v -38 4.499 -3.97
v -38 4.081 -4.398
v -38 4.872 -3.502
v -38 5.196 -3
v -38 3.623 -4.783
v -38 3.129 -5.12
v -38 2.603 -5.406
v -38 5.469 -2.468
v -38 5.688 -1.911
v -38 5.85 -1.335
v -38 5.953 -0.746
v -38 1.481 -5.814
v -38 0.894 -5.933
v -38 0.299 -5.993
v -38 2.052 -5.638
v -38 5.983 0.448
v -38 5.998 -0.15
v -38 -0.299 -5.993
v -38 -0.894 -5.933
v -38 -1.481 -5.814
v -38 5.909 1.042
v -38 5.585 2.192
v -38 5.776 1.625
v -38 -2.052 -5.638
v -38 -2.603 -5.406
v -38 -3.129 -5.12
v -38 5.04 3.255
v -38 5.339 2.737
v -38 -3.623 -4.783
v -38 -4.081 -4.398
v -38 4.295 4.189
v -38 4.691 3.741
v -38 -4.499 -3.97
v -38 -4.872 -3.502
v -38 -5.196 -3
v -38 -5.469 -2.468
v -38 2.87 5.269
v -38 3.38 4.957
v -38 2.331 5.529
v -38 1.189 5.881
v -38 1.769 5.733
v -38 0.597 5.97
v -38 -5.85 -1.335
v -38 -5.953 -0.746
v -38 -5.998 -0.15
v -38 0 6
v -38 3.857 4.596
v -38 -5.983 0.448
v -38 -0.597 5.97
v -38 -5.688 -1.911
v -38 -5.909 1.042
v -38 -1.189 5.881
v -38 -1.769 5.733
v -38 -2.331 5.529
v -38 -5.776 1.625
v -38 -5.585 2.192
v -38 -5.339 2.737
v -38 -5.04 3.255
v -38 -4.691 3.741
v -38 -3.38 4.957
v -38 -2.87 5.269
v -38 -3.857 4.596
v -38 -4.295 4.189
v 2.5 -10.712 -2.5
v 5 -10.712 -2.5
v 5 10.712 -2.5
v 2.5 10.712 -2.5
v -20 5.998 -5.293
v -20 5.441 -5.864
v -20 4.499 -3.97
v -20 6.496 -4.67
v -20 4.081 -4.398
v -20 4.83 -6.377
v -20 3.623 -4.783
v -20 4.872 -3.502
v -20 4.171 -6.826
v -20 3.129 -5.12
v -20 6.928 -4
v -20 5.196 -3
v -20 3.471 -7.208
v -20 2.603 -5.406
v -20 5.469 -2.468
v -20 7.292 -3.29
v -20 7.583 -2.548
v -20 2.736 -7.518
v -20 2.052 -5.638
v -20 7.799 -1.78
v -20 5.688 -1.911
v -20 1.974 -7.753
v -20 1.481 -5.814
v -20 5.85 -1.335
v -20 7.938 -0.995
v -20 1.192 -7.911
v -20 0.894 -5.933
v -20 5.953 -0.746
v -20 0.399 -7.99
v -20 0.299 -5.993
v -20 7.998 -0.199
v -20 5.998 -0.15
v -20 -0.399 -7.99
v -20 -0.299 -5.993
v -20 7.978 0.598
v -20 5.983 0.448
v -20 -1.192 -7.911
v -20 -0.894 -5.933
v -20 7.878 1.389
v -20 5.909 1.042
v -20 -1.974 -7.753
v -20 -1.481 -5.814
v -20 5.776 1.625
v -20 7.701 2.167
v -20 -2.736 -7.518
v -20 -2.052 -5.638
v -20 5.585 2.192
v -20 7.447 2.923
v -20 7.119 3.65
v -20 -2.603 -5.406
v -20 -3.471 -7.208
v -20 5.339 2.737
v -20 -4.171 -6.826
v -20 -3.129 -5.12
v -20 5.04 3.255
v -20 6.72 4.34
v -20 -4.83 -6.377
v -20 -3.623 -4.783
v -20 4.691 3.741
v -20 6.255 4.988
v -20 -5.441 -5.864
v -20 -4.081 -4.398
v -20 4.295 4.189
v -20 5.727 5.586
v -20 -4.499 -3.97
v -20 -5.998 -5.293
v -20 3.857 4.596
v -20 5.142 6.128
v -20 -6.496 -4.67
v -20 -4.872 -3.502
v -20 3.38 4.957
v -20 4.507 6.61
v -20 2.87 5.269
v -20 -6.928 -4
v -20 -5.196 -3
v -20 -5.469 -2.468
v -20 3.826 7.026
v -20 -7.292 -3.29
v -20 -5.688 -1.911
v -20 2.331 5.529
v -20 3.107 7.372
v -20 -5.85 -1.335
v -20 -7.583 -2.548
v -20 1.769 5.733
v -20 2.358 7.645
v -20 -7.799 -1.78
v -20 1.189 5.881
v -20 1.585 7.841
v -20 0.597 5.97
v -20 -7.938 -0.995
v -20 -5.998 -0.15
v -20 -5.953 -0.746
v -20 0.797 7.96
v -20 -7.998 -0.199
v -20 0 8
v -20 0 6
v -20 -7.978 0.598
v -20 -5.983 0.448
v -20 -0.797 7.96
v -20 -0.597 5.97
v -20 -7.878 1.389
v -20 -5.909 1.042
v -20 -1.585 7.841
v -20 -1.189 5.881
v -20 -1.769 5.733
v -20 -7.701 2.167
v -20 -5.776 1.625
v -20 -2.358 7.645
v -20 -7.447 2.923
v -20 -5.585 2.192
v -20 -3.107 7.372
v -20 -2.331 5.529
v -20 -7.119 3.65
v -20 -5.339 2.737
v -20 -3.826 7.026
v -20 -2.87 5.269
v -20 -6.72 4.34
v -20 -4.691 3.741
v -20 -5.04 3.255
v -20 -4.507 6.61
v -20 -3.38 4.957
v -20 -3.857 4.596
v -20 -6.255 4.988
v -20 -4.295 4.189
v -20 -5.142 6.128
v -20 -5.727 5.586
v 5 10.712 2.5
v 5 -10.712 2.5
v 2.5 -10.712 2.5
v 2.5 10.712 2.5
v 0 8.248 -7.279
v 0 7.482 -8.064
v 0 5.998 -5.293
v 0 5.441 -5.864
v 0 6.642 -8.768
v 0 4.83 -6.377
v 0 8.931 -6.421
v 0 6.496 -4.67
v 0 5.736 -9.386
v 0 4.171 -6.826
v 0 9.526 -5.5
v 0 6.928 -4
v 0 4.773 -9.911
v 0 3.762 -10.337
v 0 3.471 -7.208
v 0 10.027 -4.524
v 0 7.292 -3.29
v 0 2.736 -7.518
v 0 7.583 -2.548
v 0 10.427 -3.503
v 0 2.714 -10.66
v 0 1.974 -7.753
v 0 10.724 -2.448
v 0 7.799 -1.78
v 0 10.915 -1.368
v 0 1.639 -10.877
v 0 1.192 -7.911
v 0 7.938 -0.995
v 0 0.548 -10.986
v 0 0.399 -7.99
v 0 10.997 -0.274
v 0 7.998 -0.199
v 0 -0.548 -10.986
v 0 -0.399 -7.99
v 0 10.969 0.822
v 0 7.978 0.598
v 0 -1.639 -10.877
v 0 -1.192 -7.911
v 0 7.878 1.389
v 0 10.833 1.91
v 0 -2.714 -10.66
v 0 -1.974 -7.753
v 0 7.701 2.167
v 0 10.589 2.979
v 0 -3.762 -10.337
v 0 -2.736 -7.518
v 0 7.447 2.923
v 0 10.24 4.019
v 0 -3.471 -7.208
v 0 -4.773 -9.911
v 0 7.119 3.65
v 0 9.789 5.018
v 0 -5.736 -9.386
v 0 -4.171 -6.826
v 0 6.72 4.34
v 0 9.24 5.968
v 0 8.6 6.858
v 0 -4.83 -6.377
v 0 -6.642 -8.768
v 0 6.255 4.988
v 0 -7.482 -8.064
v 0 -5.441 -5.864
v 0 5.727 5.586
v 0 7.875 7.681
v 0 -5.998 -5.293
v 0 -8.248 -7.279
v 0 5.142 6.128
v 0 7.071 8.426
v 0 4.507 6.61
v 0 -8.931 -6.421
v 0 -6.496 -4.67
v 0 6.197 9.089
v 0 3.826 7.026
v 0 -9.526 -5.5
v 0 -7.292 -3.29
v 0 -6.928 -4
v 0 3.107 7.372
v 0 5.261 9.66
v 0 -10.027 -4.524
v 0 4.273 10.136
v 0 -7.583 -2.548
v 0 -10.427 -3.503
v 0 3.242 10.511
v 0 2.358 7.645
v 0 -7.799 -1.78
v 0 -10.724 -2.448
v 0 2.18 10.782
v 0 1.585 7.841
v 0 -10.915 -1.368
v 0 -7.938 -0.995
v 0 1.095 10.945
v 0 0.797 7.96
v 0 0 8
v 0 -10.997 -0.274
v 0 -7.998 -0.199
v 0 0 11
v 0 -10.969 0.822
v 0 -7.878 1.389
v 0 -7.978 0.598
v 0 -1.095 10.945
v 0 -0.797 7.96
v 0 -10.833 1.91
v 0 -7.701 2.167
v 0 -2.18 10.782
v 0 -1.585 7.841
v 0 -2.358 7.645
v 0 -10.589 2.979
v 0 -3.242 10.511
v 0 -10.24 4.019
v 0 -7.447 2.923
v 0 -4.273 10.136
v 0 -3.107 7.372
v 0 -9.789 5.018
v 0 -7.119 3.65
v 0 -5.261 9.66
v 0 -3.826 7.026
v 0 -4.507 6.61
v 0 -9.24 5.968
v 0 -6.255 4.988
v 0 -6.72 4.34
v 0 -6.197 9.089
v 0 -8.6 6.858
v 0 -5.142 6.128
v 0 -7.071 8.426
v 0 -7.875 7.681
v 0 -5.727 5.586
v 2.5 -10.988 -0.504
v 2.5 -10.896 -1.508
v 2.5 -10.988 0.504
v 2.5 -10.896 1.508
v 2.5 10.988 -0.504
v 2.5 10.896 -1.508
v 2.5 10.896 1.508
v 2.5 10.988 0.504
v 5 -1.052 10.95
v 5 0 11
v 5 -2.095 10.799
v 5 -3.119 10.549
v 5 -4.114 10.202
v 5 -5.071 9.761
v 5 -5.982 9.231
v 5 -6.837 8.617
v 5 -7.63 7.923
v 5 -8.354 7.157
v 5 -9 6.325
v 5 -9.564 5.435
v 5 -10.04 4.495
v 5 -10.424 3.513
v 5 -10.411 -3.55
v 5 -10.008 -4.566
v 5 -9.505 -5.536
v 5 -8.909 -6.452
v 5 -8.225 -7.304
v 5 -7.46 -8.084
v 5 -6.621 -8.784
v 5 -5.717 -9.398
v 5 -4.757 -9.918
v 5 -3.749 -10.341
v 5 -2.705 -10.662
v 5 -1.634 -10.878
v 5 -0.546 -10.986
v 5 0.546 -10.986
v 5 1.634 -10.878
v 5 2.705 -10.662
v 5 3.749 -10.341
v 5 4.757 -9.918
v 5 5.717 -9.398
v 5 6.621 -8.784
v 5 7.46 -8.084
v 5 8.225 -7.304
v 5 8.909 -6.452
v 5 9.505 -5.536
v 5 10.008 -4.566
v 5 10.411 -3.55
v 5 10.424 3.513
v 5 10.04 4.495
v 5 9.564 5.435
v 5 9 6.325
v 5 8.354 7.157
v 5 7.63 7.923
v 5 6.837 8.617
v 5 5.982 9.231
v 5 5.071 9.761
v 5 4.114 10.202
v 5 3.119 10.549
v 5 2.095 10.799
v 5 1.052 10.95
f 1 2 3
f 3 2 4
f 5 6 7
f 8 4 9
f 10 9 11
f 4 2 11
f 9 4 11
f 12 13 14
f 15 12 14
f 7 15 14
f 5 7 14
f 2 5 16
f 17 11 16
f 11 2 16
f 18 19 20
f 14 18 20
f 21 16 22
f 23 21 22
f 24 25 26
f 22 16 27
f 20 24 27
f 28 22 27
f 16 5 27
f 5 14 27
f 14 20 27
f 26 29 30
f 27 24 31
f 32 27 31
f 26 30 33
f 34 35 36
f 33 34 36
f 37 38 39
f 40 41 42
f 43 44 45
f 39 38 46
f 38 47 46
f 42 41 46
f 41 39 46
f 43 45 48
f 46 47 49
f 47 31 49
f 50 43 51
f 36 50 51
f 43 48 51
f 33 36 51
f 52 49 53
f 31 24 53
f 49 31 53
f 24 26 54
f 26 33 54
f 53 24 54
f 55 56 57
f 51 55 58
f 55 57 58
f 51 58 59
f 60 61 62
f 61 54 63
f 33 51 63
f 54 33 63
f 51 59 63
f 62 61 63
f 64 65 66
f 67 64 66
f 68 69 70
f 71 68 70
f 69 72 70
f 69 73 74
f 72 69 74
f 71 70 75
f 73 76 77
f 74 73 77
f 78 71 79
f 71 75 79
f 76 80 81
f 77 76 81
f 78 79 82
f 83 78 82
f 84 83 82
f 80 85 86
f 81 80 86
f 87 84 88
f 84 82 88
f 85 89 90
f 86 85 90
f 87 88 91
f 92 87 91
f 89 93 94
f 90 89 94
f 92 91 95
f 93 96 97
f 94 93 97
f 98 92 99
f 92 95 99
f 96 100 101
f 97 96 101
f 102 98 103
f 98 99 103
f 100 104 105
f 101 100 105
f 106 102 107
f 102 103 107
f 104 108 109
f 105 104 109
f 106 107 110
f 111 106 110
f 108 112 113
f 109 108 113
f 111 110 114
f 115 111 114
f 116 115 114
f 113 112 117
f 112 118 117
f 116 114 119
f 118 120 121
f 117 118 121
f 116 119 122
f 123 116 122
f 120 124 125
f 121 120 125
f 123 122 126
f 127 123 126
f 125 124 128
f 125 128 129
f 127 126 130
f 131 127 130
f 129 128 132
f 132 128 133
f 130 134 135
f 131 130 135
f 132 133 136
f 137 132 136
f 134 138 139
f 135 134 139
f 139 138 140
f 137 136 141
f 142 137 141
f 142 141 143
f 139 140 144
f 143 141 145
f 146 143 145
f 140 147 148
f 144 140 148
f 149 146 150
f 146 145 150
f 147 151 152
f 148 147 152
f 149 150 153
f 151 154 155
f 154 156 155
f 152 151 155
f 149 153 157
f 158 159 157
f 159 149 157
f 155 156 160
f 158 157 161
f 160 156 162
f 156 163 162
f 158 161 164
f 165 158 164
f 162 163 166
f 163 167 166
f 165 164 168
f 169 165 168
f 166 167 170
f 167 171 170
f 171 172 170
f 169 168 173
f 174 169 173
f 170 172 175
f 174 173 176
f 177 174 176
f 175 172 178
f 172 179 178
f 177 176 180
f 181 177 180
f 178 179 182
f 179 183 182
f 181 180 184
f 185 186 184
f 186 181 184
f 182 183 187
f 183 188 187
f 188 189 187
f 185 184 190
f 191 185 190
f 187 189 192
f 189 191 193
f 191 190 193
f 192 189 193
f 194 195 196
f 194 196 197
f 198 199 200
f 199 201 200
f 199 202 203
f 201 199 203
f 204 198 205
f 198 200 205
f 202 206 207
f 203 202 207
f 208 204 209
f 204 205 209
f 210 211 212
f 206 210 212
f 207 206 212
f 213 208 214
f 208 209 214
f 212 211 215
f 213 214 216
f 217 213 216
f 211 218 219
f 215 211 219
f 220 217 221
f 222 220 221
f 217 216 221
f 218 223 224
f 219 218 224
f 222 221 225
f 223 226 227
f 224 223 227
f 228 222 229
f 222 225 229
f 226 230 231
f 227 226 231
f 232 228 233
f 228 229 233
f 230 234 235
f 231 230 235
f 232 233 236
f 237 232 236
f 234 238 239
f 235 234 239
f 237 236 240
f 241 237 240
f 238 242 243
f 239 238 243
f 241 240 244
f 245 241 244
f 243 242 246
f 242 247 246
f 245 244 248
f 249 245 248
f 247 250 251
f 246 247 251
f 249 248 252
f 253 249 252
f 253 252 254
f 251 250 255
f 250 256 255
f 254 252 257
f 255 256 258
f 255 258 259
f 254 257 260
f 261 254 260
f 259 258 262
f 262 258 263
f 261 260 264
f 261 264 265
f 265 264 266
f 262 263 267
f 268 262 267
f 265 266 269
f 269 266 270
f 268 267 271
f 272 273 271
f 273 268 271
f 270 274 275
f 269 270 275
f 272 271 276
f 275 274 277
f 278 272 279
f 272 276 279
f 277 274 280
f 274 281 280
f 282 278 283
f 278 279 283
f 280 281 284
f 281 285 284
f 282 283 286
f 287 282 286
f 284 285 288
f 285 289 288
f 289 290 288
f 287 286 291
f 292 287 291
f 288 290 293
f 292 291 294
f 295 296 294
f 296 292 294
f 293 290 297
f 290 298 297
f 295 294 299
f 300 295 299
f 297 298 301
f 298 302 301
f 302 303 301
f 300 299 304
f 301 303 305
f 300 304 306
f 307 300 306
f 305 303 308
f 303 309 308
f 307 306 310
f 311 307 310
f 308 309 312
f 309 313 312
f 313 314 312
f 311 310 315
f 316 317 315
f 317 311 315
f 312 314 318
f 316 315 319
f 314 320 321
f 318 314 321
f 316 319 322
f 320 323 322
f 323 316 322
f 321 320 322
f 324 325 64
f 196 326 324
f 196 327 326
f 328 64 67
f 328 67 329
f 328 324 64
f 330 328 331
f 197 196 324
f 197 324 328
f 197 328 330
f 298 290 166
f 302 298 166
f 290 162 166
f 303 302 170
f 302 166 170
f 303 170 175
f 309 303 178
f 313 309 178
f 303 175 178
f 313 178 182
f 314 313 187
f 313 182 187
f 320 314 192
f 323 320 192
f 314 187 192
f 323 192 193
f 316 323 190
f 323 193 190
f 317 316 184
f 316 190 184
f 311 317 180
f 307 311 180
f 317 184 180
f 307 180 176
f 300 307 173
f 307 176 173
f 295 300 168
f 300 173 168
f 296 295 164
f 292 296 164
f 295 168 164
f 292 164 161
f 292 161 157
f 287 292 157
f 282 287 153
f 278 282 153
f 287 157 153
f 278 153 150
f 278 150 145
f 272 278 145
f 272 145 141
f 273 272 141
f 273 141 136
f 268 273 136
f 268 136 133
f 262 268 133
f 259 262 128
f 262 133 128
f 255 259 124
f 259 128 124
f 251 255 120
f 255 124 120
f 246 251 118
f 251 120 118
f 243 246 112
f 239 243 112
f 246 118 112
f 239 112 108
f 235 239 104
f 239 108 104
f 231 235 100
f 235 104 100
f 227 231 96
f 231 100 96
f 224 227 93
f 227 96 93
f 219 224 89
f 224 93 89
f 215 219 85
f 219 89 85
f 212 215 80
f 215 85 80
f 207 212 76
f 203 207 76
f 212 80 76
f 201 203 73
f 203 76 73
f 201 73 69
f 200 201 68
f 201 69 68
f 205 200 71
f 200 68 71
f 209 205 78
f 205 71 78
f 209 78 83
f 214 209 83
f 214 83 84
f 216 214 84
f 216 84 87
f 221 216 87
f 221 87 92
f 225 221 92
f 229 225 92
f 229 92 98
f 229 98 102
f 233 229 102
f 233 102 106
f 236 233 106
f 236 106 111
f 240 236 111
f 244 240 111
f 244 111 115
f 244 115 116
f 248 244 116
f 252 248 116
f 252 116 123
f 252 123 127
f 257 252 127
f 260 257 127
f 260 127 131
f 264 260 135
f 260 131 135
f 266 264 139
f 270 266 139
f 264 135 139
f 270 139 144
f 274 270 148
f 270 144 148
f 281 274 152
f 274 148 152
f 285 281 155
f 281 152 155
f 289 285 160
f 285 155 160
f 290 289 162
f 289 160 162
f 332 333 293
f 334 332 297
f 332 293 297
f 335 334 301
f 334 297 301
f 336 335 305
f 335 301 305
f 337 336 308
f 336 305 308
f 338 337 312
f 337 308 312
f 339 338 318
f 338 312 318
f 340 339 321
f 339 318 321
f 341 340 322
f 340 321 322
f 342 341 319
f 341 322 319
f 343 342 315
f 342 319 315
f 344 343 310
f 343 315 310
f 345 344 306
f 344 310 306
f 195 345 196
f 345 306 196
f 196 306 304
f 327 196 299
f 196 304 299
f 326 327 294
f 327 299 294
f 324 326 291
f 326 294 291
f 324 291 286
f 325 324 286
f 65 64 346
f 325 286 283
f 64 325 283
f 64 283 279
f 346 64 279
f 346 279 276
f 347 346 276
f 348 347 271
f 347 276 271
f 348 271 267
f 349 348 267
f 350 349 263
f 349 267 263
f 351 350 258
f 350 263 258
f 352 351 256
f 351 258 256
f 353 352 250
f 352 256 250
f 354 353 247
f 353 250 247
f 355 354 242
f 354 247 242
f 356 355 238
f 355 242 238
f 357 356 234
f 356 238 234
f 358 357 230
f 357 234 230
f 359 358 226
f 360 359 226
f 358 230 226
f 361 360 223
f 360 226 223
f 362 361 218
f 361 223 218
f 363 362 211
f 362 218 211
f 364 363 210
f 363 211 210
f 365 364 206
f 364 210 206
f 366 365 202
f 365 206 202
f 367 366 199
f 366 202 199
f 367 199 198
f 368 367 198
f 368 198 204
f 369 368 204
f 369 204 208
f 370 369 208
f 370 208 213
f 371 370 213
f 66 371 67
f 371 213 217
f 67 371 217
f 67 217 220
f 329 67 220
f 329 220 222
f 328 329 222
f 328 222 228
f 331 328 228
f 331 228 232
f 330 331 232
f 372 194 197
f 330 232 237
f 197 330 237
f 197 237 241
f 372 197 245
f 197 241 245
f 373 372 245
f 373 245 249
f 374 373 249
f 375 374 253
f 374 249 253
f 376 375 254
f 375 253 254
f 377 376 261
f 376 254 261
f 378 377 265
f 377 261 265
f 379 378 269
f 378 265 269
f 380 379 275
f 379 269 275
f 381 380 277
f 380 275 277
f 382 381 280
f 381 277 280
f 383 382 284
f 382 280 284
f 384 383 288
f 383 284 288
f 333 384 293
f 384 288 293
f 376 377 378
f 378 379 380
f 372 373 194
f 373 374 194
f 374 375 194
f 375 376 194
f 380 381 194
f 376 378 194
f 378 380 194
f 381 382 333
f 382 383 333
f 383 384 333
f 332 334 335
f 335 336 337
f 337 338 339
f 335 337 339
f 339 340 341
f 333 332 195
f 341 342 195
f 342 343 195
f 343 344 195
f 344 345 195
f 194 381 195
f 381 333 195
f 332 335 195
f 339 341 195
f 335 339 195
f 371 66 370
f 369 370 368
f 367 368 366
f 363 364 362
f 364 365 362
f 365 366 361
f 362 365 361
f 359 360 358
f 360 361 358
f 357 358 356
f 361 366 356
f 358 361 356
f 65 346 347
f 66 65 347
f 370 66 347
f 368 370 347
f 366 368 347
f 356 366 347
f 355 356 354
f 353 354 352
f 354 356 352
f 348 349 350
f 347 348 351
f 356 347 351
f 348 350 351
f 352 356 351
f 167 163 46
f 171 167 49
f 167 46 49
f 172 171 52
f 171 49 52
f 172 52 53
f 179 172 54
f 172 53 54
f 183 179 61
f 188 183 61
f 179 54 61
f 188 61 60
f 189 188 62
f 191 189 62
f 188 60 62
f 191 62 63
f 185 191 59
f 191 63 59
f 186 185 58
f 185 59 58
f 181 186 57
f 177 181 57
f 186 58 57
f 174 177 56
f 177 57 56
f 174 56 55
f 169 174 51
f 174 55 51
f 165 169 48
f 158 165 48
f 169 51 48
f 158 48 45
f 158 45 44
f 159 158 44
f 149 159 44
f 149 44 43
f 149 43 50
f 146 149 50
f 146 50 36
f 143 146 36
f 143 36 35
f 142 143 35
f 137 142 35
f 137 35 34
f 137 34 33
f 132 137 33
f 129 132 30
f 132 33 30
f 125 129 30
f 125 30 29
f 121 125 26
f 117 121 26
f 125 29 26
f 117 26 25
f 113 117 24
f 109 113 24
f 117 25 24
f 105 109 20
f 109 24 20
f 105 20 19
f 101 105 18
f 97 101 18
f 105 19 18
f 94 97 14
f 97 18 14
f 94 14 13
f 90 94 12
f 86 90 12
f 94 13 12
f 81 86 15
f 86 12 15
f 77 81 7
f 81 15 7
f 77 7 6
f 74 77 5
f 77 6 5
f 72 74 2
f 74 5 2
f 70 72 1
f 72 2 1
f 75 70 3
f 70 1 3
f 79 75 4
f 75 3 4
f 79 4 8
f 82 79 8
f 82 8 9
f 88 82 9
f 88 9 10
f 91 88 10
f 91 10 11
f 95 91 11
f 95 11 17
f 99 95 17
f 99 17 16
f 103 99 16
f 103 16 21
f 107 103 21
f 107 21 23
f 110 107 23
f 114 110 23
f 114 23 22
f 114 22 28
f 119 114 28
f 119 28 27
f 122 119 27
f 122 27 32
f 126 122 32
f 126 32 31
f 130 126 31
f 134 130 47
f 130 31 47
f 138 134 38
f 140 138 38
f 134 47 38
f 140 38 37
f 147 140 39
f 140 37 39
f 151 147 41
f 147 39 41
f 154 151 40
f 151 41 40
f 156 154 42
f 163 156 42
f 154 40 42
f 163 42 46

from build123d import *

# Parameters (mm, degrees)
F2_W     = 62.190262
F2_H     = 5
F3_DEPTH = 2.5


with BuildPart() as f1:
    # F0 (on Front) → F1 (revolve)
    with BuildSketch(Plane.XZ):
        Polygon((-38, 6), (-38, 0), (5, 0), (5, 11), (0, 11), (0, 8), (-20, 8), (-20, 6), align=None)
    revolve(axis=Axis((-10.440066, 0, 0), (1, 0, 0)))

    # F2 (on face) → F3 (cut)
    with BuildSketch(Plane.YZ.offset(5)):
        with Locations((-2.05223, 0)):
            Rectangle(F2_W, F2_H)
    extrude(amount=-F3_DEPTH, mode=Mode.SUBTRACT)


solid = f1.part
